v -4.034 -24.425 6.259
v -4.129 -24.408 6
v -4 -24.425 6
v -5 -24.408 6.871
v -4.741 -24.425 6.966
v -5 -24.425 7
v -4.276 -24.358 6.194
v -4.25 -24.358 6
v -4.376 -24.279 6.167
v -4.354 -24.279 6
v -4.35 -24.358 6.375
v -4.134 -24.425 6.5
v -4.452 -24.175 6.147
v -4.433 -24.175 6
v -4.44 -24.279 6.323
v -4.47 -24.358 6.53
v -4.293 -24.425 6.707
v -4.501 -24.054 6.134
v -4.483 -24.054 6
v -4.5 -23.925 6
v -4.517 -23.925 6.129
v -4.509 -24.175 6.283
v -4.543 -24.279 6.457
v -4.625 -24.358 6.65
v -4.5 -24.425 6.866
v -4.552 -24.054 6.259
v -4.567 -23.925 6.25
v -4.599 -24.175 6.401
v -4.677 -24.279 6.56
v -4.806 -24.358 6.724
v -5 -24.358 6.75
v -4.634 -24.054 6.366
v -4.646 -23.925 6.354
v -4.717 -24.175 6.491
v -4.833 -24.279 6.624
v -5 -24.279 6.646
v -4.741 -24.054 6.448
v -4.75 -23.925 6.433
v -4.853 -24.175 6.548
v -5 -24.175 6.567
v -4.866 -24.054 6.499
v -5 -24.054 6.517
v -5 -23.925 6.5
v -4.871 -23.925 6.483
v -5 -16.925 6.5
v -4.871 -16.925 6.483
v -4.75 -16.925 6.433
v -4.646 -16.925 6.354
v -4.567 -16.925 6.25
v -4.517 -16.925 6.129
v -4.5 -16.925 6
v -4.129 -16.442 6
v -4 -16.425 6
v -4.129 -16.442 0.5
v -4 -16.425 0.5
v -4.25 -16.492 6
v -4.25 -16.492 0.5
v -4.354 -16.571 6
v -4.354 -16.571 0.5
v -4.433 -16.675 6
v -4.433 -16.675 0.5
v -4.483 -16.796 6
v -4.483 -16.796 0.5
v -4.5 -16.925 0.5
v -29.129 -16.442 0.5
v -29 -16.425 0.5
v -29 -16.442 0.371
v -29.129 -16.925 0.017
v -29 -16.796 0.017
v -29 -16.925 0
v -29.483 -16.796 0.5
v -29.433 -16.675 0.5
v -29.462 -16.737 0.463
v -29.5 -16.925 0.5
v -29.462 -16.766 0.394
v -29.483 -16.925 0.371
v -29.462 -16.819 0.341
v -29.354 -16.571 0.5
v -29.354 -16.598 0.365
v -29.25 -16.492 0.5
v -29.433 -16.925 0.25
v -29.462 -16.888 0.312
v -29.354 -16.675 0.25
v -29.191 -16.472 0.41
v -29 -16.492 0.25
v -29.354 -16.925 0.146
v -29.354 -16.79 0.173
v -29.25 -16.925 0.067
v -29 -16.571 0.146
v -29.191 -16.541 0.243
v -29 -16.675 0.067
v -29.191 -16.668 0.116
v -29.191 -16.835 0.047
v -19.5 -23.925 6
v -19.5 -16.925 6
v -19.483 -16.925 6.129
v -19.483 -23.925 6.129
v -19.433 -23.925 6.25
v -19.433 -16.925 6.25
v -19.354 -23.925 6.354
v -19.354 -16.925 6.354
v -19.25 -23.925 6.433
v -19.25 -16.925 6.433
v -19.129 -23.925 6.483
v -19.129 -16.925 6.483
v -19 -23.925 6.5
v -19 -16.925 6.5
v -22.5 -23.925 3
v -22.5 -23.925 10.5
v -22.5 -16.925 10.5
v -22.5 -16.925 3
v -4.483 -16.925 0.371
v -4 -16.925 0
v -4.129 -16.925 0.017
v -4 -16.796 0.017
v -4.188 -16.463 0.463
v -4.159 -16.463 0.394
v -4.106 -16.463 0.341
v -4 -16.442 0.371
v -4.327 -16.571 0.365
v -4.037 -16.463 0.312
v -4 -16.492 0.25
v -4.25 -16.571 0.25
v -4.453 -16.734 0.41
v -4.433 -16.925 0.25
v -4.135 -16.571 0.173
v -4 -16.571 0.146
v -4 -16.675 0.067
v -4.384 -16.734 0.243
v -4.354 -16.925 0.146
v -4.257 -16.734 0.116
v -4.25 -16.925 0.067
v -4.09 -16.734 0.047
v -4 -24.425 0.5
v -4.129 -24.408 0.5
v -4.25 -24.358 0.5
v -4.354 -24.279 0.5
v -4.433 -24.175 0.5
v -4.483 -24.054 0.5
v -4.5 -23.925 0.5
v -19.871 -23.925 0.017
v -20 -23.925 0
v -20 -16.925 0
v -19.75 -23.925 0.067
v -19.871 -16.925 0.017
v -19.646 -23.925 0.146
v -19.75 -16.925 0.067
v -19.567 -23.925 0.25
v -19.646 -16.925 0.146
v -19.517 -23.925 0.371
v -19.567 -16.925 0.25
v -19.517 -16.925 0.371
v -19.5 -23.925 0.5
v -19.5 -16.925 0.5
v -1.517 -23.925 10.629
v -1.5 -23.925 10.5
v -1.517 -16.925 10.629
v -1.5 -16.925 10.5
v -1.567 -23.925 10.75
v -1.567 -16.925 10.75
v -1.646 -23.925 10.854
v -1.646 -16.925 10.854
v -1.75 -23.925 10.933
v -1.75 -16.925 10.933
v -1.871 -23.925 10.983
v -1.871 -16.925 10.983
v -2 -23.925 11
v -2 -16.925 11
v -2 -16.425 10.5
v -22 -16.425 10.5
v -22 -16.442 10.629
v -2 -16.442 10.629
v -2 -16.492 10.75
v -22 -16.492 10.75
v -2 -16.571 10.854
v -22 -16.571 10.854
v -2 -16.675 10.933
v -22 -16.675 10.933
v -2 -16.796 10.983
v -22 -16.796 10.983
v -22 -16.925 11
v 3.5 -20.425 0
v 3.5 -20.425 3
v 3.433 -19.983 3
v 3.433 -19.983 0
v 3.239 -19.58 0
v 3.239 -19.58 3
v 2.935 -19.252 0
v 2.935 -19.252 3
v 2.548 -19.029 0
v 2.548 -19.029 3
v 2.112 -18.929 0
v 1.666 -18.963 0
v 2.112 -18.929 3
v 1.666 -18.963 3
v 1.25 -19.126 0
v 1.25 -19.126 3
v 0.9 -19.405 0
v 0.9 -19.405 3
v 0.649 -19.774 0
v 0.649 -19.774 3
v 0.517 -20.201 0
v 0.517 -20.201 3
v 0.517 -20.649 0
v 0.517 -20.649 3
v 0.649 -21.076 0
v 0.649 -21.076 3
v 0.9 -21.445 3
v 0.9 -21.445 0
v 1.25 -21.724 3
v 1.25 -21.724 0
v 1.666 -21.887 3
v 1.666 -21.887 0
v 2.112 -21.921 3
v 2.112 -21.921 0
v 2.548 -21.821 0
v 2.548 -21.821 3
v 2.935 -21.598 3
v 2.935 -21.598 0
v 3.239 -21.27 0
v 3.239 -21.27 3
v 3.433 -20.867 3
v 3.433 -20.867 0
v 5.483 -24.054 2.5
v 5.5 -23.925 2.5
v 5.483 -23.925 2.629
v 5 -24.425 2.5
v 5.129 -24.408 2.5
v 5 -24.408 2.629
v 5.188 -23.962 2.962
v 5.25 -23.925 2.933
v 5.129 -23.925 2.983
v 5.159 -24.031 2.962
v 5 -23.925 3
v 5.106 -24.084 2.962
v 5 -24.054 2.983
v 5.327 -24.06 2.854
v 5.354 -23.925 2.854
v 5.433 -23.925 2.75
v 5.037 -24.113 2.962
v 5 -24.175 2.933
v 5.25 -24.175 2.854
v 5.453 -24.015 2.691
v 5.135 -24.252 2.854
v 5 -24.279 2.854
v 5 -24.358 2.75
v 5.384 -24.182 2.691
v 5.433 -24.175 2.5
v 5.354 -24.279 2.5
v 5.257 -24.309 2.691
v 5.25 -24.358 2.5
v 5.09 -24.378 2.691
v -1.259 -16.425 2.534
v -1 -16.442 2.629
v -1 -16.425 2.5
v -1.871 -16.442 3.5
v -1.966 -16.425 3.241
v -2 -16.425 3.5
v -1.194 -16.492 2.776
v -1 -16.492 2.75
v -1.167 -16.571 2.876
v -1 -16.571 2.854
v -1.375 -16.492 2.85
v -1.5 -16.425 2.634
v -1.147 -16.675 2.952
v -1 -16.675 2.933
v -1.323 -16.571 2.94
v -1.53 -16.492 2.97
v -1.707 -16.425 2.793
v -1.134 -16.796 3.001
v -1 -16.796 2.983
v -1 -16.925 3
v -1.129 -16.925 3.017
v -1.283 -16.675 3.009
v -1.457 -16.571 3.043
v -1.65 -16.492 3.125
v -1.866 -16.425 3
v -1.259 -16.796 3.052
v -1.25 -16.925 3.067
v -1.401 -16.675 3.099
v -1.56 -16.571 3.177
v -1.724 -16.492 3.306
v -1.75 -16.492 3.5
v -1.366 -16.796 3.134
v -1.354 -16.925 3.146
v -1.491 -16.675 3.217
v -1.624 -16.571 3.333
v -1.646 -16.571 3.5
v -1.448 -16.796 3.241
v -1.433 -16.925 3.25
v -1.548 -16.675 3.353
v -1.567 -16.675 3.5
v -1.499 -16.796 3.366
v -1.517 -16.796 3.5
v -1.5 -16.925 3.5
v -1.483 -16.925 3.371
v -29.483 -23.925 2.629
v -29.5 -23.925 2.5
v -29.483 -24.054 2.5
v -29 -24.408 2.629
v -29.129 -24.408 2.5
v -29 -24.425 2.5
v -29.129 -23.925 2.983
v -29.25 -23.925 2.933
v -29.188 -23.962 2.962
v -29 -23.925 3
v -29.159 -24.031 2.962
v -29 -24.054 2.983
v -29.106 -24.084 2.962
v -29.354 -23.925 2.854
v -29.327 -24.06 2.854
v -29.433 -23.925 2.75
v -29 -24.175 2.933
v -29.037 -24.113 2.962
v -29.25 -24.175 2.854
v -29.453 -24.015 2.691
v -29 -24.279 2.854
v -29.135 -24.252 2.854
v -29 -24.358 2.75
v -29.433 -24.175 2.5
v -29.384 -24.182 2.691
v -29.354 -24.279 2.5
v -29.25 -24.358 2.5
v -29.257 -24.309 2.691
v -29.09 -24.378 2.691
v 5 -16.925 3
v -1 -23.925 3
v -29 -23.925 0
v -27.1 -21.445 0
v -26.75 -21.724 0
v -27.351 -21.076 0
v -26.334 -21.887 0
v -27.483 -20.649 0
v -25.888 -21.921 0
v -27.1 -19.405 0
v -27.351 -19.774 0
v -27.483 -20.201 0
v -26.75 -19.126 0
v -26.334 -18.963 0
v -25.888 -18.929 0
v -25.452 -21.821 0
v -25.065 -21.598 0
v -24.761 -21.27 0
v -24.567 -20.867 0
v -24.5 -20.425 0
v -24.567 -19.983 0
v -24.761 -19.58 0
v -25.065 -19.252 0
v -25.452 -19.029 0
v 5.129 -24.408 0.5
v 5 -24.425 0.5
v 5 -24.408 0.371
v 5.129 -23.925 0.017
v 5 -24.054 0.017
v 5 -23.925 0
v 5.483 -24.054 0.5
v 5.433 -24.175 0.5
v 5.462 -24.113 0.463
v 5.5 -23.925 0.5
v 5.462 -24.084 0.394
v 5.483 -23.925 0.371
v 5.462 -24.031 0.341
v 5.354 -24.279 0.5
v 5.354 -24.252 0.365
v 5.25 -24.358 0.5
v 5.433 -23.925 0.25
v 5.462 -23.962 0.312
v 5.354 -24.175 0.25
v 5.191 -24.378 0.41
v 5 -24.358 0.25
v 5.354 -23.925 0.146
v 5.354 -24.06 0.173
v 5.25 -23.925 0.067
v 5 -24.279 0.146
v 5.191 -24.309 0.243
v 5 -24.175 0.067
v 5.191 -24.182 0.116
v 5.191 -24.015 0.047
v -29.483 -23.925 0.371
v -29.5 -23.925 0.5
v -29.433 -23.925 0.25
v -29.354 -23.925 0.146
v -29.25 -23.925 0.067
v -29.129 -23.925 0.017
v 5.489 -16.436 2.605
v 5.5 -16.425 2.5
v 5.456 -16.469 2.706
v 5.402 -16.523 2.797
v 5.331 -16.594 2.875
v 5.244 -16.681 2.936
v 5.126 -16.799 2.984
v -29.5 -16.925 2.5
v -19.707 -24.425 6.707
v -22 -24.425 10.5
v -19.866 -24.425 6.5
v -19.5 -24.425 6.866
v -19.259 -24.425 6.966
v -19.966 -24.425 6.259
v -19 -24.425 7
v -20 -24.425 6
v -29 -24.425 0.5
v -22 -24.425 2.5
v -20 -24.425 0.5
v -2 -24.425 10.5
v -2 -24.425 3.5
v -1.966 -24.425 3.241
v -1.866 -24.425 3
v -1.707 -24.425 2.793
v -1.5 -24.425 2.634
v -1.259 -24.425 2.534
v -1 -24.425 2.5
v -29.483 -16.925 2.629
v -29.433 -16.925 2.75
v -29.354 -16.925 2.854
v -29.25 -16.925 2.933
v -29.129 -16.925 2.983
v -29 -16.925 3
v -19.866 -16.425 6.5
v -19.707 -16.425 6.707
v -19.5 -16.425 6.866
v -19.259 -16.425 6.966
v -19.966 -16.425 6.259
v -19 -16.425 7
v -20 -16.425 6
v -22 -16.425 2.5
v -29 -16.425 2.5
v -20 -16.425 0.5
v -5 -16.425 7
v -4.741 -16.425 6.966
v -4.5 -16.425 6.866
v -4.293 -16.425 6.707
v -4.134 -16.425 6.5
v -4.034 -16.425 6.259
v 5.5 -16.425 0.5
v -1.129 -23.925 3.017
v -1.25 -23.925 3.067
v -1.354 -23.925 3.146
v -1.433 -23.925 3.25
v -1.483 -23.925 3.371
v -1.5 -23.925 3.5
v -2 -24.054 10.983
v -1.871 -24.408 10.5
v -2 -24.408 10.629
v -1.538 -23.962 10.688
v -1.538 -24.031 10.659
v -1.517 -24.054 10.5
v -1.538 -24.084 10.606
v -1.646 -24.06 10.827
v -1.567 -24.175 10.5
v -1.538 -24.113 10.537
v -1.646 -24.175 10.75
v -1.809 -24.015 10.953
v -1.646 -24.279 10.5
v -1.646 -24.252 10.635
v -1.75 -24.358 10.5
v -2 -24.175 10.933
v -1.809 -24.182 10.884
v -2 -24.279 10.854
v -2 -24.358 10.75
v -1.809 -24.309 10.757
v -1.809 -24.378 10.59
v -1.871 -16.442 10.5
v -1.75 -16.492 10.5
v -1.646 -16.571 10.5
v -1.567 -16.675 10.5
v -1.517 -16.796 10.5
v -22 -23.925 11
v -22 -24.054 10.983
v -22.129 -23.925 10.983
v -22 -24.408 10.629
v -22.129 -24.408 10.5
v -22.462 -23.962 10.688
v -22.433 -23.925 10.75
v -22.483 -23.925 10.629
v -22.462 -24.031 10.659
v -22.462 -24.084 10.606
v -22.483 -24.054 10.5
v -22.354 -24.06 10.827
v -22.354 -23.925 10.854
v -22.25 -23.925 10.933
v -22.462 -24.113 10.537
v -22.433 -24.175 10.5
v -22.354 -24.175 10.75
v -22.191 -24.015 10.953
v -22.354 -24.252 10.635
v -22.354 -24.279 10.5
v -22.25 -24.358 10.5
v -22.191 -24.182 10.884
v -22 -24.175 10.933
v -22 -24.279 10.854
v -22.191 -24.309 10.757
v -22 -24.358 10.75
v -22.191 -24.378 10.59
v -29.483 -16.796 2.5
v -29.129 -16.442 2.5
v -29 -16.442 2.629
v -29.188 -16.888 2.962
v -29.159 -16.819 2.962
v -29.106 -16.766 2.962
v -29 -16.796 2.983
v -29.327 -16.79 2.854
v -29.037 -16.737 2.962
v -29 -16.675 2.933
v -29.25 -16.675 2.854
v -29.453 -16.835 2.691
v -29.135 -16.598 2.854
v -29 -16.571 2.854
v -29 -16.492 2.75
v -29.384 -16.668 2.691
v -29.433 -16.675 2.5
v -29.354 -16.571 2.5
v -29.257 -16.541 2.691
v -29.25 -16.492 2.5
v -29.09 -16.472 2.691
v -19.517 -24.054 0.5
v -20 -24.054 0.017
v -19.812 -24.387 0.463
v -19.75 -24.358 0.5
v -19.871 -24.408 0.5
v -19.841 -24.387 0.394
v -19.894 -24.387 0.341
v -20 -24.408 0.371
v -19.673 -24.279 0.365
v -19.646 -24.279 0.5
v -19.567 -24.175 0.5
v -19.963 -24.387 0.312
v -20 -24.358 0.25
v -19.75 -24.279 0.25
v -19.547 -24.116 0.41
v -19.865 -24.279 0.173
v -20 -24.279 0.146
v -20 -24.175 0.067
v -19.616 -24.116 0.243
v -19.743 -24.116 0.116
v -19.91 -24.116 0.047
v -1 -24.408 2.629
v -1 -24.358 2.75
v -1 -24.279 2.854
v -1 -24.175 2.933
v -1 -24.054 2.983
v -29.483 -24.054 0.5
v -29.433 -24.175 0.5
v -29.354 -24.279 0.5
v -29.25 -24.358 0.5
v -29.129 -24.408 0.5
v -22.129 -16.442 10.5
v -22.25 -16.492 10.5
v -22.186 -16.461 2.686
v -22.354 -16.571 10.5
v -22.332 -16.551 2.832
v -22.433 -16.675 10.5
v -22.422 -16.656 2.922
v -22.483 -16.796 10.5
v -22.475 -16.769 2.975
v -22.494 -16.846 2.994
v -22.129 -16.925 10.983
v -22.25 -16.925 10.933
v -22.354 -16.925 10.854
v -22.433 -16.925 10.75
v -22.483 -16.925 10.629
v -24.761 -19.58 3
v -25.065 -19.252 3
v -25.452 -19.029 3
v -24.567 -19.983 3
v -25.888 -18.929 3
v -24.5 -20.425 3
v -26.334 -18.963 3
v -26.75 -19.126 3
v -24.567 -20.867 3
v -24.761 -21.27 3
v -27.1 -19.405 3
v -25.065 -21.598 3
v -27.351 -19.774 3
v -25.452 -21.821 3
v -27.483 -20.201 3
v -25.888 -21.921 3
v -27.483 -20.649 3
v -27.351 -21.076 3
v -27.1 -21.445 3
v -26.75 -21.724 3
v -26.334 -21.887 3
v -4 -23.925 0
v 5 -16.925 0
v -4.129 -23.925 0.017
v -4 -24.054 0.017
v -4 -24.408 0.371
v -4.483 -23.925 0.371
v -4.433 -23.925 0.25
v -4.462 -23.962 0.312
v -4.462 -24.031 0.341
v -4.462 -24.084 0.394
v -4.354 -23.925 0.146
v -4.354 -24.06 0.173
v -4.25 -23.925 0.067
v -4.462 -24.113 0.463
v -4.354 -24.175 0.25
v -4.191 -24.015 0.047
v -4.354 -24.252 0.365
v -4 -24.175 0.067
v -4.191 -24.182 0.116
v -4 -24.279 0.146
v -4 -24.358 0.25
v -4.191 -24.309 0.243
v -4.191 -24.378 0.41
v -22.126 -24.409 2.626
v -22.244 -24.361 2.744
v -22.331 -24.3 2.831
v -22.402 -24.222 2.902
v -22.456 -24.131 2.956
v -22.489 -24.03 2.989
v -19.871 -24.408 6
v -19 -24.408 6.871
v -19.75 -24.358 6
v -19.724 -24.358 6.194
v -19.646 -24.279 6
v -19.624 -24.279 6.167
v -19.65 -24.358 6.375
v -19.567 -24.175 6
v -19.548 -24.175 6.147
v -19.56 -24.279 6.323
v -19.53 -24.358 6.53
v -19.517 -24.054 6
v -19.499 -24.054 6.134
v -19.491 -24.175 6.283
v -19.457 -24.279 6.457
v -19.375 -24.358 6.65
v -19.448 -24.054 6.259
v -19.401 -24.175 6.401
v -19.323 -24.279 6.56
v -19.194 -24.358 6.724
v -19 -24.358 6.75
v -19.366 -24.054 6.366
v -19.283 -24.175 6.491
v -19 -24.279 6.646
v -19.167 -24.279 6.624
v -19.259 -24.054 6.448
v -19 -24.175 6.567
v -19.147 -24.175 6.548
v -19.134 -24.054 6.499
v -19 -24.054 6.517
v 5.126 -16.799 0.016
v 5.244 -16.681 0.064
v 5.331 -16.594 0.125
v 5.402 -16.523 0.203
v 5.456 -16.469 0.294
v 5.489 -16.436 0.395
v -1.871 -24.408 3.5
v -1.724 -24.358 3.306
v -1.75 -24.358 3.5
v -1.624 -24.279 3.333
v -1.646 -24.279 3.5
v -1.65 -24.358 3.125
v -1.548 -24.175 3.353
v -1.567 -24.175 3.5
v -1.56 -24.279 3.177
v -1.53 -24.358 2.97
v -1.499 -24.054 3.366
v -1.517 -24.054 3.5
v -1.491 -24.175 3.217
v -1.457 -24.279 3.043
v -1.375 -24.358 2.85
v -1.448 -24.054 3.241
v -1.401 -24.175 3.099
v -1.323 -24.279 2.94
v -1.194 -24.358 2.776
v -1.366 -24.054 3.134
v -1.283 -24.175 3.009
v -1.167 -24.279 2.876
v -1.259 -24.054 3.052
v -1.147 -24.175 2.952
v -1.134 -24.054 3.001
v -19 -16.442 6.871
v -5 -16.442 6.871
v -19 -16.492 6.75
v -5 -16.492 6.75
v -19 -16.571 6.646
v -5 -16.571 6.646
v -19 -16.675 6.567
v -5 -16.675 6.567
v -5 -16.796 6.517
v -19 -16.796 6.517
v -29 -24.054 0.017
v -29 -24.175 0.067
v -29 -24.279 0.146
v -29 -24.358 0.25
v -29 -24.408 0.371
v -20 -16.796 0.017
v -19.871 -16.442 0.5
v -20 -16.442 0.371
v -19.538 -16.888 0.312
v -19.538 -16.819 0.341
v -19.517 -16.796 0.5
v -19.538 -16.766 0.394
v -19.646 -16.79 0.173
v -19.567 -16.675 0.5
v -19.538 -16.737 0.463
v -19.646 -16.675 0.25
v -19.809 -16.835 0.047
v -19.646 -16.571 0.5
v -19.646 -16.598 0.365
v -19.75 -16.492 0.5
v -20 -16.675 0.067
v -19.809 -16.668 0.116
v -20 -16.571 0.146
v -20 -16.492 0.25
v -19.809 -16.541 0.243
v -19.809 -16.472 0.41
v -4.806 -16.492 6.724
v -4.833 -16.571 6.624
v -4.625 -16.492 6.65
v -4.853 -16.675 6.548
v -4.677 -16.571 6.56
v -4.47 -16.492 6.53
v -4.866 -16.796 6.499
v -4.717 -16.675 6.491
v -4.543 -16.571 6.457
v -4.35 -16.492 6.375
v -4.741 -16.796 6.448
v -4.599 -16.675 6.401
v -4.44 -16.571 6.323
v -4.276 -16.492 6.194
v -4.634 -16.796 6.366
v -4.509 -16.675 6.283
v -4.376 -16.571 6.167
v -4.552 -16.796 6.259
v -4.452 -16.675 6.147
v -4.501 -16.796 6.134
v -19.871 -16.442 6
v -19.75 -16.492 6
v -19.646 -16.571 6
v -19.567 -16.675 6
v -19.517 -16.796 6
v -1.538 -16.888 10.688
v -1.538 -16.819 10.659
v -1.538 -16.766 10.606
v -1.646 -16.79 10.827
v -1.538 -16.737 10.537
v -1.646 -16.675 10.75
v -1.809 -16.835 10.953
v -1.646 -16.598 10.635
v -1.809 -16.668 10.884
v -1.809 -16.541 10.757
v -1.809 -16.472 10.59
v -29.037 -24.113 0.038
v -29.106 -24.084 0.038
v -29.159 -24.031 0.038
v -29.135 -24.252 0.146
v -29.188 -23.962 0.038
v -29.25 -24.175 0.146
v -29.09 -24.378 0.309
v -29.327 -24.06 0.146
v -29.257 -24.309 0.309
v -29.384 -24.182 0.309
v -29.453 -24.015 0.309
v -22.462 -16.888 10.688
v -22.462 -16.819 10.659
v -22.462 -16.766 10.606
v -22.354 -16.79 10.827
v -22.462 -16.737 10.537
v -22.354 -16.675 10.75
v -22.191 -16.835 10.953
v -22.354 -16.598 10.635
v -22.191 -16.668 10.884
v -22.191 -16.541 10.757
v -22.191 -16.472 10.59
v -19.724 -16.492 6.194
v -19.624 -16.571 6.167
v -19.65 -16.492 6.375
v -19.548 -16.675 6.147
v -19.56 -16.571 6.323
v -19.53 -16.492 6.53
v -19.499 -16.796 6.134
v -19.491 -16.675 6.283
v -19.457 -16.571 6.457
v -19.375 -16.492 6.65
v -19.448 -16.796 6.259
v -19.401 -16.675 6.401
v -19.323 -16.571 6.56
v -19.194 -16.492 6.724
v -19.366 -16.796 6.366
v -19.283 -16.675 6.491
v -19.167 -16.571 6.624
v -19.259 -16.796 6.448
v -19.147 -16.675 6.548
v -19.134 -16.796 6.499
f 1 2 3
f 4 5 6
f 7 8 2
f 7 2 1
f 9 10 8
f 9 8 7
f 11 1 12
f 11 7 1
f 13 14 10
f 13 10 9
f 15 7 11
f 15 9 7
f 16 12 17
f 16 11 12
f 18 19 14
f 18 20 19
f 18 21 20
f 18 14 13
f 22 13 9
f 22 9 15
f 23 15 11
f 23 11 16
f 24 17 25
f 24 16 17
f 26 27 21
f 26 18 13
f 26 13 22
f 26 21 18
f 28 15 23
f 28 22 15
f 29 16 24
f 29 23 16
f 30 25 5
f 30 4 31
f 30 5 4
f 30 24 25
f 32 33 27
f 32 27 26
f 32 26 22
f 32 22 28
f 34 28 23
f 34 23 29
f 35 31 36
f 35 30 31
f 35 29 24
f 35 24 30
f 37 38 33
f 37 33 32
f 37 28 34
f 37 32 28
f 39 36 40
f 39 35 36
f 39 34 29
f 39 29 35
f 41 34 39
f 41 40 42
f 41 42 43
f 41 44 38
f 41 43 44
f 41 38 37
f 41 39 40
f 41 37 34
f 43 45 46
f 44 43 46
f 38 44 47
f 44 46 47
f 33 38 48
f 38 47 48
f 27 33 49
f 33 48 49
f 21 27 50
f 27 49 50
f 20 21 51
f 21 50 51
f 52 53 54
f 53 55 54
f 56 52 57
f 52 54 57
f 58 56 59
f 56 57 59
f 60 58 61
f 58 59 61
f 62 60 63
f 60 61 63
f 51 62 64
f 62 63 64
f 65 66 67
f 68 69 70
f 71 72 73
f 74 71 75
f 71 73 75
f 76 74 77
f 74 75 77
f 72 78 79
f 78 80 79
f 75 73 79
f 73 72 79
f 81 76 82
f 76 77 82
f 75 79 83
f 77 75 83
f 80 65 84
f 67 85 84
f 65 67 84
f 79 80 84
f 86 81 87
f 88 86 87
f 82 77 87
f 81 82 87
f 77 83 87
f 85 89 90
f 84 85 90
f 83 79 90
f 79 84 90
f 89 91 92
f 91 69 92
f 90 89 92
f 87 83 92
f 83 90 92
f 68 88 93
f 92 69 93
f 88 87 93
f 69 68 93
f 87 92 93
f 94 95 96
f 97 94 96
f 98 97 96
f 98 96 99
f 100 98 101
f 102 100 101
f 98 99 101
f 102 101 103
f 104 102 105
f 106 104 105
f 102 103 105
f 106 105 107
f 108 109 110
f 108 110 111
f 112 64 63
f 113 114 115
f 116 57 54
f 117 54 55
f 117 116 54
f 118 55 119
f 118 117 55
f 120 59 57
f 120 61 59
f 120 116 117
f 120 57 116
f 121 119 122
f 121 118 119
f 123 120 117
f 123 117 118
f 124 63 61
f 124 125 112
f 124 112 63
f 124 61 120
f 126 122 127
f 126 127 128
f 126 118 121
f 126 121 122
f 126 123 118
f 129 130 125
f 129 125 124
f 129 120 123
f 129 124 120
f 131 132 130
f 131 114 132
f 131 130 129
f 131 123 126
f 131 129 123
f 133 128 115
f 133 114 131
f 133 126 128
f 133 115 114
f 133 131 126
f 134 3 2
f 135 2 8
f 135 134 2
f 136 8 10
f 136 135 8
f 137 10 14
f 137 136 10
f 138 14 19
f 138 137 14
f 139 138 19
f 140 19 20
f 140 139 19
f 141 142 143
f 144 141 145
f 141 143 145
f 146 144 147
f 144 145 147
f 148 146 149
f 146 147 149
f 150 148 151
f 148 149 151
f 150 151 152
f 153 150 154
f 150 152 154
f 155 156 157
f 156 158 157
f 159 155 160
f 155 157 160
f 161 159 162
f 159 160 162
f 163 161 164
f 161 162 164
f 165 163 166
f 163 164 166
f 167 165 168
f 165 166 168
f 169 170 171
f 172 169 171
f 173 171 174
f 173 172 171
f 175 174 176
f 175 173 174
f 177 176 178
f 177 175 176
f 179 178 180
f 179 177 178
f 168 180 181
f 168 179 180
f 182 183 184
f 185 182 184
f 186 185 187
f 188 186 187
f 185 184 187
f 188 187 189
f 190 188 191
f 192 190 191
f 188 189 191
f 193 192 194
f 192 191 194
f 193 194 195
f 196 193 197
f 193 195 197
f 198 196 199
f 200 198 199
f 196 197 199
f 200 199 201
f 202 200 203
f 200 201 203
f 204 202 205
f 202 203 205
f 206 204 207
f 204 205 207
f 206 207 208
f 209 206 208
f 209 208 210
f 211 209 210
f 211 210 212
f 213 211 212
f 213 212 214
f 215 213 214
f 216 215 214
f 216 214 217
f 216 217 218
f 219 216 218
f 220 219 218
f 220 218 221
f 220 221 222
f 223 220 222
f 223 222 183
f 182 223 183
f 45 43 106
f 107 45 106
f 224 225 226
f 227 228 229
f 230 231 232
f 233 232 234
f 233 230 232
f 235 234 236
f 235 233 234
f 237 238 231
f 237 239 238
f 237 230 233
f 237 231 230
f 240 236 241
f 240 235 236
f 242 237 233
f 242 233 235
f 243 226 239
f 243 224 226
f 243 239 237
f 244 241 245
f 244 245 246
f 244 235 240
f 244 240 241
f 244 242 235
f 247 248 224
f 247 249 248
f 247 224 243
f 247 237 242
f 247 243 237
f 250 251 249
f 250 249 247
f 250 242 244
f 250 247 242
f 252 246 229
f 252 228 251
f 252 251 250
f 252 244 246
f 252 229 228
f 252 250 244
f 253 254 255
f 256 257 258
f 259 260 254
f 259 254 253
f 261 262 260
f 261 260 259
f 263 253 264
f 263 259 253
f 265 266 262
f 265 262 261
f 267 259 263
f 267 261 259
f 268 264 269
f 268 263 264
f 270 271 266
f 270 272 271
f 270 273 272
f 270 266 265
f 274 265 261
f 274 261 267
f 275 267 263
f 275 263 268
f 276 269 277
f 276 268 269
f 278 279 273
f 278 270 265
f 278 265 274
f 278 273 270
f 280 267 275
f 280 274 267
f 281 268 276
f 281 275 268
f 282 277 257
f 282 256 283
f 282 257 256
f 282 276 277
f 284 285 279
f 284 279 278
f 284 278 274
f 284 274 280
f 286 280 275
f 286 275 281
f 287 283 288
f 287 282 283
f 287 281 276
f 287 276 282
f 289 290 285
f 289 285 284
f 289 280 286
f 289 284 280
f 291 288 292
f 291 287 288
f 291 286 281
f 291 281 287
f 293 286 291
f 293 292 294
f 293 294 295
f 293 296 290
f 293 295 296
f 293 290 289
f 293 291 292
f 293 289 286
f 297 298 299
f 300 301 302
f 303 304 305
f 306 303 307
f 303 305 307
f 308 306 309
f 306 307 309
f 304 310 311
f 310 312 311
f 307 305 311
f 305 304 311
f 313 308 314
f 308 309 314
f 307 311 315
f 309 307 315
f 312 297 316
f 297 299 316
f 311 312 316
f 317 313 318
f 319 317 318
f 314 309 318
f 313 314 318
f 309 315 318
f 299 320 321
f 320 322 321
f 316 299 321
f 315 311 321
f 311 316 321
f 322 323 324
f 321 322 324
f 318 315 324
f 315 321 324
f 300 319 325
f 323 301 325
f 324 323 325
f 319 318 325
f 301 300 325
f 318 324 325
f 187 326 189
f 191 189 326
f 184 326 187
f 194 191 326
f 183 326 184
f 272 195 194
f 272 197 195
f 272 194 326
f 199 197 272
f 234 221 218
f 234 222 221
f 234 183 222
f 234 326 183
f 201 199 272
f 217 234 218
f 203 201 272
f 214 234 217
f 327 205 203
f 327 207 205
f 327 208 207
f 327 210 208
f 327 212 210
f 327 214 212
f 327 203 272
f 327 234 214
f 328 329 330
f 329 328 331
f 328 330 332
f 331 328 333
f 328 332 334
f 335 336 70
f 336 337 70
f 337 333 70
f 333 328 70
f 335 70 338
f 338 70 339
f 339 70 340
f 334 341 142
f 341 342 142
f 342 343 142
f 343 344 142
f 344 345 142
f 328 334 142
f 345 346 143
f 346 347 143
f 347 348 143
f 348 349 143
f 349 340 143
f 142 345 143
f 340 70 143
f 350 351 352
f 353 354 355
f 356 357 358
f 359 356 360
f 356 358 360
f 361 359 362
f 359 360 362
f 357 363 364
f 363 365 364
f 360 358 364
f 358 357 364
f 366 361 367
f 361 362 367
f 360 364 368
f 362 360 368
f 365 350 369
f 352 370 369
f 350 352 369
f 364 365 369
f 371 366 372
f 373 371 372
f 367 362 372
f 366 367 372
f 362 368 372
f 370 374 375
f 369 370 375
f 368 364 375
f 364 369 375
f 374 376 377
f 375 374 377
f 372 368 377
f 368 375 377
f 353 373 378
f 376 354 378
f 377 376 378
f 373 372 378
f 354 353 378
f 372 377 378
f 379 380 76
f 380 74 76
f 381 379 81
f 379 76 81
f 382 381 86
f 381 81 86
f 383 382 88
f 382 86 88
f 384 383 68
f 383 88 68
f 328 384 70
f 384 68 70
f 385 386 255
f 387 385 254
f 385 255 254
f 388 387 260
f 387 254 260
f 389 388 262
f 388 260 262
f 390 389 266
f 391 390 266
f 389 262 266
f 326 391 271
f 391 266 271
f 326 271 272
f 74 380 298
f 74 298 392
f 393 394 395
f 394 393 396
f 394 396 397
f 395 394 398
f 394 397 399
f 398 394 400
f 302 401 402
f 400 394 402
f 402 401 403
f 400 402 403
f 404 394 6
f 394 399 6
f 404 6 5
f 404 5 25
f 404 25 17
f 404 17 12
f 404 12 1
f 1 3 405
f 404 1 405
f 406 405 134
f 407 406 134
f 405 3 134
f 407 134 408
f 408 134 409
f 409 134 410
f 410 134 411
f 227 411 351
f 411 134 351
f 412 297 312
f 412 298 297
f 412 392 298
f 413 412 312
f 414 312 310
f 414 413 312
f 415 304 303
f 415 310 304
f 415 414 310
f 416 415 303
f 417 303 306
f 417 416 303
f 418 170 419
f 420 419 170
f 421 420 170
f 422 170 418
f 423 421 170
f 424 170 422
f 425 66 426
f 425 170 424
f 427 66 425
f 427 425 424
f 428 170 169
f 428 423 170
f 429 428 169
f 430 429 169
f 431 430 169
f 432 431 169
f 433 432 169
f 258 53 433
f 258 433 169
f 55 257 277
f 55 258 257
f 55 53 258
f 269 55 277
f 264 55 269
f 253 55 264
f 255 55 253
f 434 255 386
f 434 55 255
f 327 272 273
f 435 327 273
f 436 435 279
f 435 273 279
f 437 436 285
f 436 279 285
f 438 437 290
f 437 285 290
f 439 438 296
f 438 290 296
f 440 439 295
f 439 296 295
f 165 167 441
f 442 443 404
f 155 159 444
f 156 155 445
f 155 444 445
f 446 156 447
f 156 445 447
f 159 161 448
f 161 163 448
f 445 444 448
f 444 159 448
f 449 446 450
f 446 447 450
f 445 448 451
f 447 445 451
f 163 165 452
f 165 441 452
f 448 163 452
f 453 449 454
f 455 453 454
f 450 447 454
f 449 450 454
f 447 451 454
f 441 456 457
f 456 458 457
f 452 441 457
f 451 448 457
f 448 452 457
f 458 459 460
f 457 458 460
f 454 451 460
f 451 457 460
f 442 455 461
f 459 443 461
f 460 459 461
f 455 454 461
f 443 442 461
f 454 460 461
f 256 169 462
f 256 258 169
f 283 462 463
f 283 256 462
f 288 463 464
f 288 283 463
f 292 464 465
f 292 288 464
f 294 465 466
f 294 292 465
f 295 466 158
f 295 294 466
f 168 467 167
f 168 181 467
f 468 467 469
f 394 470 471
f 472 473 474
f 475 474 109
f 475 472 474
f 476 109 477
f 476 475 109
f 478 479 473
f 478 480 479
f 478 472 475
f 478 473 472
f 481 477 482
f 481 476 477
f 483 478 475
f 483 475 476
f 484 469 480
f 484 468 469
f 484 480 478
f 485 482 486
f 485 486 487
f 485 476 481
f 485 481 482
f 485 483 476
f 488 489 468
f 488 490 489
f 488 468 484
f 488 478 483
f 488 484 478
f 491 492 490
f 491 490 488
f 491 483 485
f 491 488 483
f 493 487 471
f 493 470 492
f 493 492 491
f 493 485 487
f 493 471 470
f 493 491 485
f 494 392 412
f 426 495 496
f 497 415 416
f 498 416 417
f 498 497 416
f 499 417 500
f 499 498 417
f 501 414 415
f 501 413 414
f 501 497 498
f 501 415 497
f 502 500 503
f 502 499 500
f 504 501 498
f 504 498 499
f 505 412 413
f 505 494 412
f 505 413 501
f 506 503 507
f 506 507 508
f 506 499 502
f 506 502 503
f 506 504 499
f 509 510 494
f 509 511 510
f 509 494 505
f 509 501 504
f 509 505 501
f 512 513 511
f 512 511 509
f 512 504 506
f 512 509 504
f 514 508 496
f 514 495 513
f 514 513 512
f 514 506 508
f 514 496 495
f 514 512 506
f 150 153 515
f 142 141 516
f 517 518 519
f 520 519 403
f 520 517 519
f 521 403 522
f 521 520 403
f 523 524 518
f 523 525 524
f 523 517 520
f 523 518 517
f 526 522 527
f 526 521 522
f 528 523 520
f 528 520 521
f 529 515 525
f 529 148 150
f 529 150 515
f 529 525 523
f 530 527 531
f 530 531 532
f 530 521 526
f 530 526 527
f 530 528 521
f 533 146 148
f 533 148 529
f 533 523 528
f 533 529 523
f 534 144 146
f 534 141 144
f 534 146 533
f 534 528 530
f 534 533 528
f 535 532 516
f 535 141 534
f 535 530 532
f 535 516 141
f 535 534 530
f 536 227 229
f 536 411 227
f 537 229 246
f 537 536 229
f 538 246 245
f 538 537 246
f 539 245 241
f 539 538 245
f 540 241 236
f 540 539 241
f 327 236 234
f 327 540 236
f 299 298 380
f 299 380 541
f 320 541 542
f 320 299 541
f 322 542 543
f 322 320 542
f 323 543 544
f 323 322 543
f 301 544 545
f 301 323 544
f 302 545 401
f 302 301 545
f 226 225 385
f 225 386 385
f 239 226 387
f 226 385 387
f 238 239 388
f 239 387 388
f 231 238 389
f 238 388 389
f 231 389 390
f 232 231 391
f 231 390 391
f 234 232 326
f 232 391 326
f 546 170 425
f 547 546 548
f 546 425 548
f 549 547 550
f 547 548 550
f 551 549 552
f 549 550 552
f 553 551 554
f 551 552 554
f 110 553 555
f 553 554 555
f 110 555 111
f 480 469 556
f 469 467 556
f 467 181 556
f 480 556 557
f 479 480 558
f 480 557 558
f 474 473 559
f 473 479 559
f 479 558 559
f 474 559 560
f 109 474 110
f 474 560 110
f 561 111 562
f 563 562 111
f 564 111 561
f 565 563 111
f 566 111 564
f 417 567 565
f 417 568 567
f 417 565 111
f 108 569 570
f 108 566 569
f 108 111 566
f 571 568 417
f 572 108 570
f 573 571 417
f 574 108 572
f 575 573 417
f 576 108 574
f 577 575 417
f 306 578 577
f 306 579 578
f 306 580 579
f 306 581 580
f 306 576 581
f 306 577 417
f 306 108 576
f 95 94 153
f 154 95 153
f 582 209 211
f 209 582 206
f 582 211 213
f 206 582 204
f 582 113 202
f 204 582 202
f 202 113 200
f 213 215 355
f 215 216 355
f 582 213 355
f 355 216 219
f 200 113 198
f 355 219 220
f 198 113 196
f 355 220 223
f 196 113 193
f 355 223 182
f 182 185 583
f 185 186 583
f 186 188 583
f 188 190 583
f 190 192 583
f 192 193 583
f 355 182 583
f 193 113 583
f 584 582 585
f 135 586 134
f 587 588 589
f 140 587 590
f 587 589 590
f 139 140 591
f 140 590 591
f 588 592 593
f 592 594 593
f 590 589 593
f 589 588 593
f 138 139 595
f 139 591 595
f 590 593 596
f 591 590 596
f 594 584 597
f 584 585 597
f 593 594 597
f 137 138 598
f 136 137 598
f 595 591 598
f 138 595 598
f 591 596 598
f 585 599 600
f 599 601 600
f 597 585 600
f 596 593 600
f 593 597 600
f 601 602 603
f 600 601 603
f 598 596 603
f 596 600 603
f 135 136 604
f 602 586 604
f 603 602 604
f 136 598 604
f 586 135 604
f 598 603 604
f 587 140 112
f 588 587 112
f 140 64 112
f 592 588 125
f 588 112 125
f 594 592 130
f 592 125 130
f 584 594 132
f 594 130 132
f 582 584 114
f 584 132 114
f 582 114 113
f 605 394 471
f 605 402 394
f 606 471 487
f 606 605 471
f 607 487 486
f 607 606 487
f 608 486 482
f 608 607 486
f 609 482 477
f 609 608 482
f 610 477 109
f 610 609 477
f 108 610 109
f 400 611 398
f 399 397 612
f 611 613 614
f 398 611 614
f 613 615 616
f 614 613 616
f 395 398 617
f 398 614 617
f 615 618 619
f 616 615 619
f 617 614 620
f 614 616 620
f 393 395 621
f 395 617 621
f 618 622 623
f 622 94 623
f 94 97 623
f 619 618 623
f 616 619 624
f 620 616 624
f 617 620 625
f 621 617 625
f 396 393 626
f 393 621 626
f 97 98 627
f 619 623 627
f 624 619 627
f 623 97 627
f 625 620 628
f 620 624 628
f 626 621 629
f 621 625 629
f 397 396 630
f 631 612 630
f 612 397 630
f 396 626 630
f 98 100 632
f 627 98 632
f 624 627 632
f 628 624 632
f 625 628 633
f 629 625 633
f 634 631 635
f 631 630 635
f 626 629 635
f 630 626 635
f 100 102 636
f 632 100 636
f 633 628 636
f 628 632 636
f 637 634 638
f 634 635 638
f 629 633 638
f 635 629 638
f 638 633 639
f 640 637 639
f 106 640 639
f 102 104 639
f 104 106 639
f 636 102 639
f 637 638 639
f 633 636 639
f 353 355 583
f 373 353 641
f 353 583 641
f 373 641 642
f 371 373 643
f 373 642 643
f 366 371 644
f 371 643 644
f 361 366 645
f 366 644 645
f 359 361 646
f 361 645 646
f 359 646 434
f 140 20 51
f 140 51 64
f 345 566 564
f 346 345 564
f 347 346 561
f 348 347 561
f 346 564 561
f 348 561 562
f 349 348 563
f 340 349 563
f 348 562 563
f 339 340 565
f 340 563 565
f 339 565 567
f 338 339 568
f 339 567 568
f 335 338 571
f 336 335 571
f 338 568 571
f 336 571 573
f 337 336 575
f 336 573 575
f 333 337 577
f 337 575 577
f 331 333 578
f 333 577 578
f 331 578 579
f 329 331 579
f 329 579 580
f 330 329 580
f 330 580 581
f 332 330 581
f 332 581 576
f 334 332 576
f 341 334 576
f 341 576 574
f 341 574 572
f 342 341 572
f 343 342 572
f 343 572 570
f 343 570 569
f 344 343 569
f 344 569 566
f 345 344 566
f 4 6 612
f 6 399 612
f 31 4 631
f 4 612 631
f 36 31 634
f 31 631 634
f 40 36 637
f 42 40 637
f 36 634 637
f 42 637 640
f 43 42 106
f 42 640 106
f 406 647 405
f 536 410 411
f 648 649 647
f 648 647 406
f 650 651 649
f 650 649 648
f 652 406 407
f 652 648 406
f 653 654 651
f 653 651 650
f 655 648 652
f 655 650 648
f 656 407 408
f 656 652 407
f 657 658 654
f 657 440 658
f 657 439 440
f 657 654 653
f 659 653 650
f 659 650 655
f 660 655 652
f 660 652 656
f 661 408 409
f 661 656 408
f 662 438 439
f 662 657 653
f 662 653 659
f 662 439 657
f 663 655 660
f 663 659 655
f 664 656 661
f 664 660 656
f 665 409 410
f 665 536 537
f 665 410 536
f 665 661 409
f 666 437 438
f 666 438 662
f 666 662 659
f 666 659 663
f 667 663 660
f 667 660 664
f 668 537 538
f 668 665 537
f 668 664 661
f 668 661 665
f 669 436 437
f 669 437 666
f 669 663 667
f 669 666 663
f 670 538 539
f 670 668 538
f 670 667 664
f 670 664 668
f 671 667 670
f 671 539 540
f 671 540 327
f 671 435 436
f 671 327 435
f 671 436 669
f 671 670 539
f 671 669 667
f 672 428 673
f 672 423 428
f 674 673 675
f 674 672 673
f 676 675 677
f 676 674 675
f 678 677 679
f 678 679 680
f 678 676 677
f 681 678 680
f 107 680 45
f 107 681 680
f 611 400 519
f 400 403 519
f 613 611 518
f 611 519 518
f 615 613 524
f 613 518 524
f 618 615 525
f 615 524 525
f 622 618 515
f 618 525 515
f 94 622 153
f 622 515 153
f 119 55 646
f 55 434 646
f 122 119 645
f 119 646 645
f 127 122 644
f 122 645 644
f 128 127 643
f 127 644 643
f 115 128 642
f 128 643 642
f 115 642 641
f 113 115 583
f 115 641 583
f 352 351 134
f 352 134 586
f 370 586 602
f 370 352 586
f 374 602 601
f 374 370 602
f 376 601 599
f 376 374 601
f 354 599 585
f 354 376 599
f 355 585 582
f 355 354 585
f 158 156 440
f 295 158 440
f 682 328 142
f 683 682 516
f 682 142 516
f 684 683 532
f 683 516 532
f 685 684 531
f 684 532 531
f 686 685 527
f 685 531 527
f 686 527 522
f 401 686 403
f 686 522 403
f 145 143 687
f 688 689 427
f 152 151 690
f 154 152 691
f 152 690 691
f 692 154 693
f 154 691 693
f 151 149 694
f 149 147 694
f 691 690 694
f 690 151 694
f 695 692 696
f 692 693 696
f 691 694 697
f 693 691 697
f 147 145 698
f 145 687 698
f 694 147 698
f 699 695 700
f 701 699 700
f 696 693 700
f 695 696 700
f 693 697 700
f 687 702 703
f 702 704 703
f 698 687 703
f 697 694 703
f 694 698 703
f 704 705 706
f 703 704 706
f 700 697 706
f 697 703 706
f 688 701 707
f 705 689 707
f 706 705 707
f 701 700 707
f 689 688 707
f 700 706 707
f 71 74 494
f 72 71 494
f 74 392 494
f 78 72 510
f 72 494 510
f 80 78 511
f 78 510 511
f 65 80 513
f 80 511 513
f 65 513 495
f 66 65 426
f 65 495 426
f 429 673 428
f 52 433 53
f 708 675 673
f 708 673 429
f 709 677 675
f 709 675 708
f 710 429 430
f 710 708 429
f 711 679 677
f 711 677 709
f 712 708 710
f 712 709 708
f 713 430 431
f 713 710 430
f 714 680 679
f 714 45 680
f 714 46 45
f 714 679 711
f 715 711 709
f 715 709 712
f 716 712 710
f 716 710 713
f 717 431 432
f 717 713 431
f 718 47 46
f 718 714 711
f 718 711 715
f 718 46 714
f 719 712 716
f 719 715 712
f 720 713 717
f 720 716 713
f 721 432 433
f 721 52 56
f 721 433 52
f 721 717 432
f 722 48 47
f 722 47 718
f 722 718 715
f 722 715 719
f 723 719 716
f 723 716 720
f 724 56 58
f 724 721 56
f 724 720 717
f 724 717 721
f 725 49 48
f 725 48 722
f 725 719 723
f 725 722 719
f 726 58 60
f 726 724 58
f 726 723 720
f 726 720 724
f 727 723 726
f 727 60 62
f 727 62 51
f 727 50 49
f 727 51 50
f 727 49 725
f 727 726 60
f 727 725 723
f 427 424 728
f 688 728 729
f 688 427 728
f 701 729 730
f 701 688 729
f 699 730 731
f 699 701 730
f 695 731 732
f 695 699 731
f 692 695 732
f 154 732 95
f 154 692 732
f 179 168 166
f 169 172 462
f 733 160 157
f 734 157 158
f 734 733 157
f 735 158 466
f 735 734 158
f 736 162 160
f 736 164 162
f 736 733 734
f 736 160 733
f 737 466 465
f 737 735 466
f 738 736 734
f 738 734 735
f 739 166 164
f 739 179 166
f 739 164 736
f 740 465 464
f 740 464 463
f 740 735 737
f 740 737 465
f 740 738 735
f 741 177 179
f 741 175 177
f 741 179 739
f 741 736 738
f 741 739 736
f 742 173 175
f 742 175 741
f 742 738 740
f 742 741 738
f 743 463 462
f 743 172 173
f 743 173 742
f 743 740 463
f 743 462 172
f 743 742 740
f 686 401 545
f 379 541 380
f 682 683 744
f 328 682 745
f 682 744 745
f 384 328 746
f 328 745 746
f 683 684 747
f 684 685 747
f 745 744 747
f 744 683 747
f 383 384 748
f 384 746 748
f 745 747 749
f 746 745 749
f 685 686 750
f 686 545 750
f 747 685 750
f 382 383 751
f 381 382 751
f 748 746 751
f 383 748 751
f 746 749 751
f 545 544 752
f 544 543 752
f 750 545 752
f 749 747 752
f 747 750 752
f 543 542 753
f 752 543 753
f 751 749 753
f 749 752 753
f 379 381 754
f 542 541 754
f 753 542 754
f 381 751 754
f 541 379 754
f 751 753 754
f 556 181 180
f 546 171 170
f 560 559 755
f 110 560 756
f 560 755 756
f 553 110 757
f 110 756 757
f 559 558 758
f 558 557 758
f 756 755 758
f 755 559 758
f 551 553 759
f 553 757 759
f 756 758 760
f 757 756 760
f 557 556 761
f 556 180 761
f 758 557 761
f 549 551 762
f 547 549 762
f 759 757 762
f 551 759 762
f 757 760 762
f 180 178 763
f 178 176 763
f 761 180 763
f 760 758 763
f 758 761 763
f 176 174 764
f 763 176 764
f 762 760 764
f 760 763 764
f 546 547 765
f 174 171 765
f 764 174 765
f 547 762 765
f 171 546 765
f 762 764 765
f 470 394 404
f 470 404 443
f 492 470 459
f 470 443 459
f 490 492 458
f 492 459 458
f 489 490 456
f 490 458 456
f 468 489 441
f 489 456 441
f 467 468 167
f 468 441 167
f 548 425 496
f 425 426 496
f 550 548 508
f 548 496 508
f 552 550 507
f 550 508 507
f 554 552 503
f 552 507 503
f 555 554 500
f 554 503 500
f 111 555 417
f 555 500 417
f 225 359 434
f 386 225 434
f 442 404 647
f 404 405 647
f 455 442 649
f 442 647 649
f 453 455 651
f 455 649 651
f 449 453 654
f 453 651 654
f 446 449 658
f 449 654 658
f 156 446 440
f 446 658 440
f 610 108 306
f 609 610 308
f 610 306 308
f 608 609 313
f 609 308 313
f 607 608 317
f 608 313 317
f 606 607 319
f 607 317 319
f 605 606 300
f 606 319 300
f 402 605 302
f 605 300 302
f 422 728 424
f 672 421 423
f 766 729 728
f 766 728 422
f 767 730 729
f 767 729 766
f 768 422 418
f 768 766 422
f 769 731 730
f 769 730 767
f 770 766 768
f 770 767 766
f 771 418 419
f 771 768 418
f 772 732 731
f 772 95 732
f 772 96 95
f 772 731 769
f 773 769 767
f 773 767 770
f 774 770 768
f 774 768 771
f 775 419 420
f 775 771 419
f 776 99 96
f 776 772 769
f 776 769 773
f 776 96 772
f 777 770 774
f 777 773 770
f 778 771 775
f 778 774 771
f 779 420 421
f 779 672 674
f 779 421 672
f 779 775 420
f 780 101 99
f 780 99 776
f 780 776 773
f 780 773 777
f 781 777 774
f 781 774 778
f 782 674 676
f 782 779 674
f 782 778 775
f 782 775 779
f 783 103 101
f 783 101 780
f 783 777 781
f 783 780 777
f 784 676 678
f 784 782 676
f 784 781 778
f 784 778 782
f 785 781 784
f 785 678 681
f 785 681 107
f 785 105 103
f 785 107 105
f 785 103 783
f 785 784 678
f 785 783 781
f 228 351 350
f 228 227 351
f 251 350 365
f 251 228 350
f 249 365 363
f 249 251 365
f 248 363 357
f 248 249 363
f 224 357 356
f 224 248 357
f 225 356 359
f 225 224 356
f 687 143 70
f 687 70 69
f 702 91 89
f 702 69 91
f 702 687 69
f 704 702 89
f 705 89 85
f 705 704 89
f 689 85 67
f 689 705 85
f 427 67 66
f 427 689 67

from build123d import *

# Parameters (mm, degrees)
SKETCH1_W           = 35
SKETCH1_H           = 8
BOSS_EXTRUDE1_DEPTH = 11
CUT_EXTRUDE1_REACH  = 10
SKETCH2_W           = 15
SKETCH2_H           = 6.5
CUT_EXTRUDE2_REACH  = 10
SKETCH5_W           = 7
SKETCH5_H           = 8
CUT_EXTRUDE4_REACH  = 5
SKETCH7_R           = 1.5
FILLET1_R           = 0.5


with BuildPart() as part:
    # Sketch1 → Boss-Extrude1 (new body)
    with BuildSketch(Plane.XY):
        with Locations((-12, -20.425)):
            Rectangle(SKETCH1_W, SKETCH1_H)
    extrude(amount=BOSS_EXTRUDE1_DEPTH)

    # Sketch2 → Cut-Extrude1 (cut, up to next)
    with BuildSketch(Plane(origin=(0, -24.425, 0), x_dir=(-1, 0, 0), z_dir=(0, -1, 0)), mode=Mode.PRIVATE) as cut_extrude1_sk1:
        with Locations((12, -3.25)):
            Rectangle(SKETCH2_W, SKETCH2_H)
    cut_extrude1_tool1 = extrude(cut_extrude1_sk1.sketch, amount=-CUT_EXTRUDE1_REACH, mode=Mode.PRIVATE) & part.part
    add(cut_extrude1_tool1.solids().sort_by_distance((-12, -24.425, 3.25))[0], mode=Mode.SUBTRACT)

    # Sketch5 → Cut-Extrude2 (cut, up to next)
    with BuildSketch(Plane(origin=(0, -24.425, 0), x_dir=(-1, 0, 0), z_dir=(0, -1, 0)), mode=Mode.PRIVATE) as cut_extrude2_sk1:
        with Locations((-2, -7)):
            Rectangle(SKETCH5_W, SKETCH5_H)
    cut_extrude2_tool1 = extrude(cut_extrude2_sk1.sketch, amount=-CUT_EXTRUDE2_REACH, mode=Mode.PRIVATE) & part.part
    add(cut_extrude2_tool1.solids().sort_by_distance((2, -24.425, 7))[0], mode=Mode.SUBTRACT)
    # Sketch5 → Cut-Extrude2 (cut, up to next)
    with BuildSketch(Plane(origin=(0, -24.425, 0), x_dir=(-1, 0, 0), z_dir=(0, -1, 0)), mode=Mode.PRIVATE) as cut_extrude2_sk2:
        with Locations((26, -7)):
            Rectangle(SKETCH5_W, SKETCH5_H)
    cut_extrude2_tool2 = extrude(cut_extrude2_sk2.sketch, amount=-CUT_EXTRUDE2_REACH, mode=Mode.PRIVATE) & part.part
    add(cut_extrude2_tool2.solids().sort_by_distance((-26, -24.425, 7))[0], mode=Mode.SUBTRACT)

    # Sketch7 → Cut-Extrude4 (cut, up to next)
    with BuildSketch(Plane.XY.offset(3), mode=Mode.PRIVATE) as cut_extrude4_sk1:
        with Locations((2, -20.425)):
            Circle(SKETCH7_R)
    cut_extrude4_tool1 = extrude(cut_extrude4_sk1.sketch, amount=-CUT_EXTRUDE4_REACH, mode=Mode.PRIVATE) & part.part
    add(cut_extrude4_tool1.solids().sort_by_distance((2, -20.425, 3))[0], mode=Mode.SUBTRACT)
    # Sketch7 → Cut-Extrude4 (cut, up to next)
    with BuildSketch(Plane.XY.offset(3), mode=Mode.PRIVATE) as cut_extrude4_sk2:
        with Locations((-26, -20.425)):
            Circle(SKETCH7_R)
    cut_extrude4_tool2 = extrude(cut_extrude4_sk2.sketch, amount=-CUT_EXTRUDE4_REACH, mode=Mode.PRIVATE) & part.part
    add(cut_extrude4_tool2.solids().sort_by_distance((-26, -20.425, 3))[0], mode=Mode.SUBTRACT)

    # Fillet1
    fillet1_edges = [part.edges().sort_by_distance(p)[0] for p in [
        (-24.5, -16.425, 0),
        (0.5, -24.425, 0),
        (-19.5, -20.425, 0),
        (-19.5, -20.425, 6.5),
        (-4.5, -20.425, 6.5),
        (-4.5, -20.425, 0),
        (-19.5, -24.425, 3.25),
        (-4.5, -24.425, 3.25),
        (-12, -24.425, 6.5),
        (-19.5, -16.425, 3.25),
        (-12, -16.425, 6.5),
        (-4.5, -16.425, 3.25),
        (-12, -24.425, 11),
        (-12, -16.425, 11),
        (-29.5, -16.425, 1.5),
        (5.5, -24.425, 1.5),
        (-29.5, -24.425, 1.5),
        (5.5, -20.425, 3),
        (-1.5, -20.425, 3),
        (-1.5, -20.425, 11),
        (-1.5, -24.425, 7),
        (2, -24.425, 3),
        (2, -16.425, 3),
        (-1.5, -16.425, 7),
        (-29.5, -20.425, 3),
        (-22.5, -20.425, 11),
        (-26, -24.425, 3),
        (-22.5, -24.425, 7),
        (-22.5, -16.425, 7),
        (-26, -16.425, 3),
        (0.5, -16.425, 0),
        (5.5, -20.425, 0),
        (-24.5, -24.425, 0),
        (-29.5, -20.425, 0),
    ]]
    fillet(fillet1_edges, radius=FILLET1_R)


solid = part.part
